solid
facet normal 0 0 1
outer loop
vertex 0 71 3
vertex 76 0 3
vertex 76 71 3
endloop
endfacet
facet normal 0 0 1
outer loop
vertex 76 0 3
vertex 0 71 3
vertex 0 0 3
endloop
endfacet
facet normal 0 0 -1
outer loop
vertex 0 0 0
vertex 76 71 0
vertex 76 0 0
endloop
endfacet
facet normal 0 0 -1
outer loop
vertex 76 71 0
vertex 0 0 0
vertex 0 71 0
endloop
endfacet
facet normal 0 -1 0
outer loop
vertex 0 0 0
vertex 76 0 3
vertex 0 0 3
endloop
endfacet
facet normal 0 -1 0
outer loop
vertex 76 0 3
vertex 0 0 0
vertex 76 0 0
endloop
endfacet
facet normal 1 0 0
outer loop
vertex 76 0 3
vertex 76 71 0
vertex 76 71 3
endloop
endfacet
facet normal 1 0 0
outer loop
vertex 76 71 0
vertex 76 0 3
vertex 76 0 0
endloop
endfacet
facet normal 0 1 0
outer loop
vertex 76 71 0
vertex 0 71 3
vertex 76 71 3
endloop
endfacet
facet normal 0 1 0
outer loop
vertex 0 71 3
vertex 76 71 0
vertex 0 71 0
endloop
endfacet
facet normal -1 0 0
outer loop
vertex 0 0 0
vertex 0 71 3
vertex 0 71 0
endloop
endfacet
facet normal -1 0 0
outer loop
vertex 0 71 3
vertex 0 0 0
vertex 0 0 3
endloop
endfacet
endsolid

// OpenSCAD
// Famicom Disk System Disk Card Shell
shell_width = 76;
shell_height = 71;
shell_thickness = 3;

module fds_shell() {
    // Main shell
    cube([shell_width, shell_height, shell_thickness], center = false);
    
    // Optional: Add features like the central hub hole or label recesses here
}

fds_shell();
